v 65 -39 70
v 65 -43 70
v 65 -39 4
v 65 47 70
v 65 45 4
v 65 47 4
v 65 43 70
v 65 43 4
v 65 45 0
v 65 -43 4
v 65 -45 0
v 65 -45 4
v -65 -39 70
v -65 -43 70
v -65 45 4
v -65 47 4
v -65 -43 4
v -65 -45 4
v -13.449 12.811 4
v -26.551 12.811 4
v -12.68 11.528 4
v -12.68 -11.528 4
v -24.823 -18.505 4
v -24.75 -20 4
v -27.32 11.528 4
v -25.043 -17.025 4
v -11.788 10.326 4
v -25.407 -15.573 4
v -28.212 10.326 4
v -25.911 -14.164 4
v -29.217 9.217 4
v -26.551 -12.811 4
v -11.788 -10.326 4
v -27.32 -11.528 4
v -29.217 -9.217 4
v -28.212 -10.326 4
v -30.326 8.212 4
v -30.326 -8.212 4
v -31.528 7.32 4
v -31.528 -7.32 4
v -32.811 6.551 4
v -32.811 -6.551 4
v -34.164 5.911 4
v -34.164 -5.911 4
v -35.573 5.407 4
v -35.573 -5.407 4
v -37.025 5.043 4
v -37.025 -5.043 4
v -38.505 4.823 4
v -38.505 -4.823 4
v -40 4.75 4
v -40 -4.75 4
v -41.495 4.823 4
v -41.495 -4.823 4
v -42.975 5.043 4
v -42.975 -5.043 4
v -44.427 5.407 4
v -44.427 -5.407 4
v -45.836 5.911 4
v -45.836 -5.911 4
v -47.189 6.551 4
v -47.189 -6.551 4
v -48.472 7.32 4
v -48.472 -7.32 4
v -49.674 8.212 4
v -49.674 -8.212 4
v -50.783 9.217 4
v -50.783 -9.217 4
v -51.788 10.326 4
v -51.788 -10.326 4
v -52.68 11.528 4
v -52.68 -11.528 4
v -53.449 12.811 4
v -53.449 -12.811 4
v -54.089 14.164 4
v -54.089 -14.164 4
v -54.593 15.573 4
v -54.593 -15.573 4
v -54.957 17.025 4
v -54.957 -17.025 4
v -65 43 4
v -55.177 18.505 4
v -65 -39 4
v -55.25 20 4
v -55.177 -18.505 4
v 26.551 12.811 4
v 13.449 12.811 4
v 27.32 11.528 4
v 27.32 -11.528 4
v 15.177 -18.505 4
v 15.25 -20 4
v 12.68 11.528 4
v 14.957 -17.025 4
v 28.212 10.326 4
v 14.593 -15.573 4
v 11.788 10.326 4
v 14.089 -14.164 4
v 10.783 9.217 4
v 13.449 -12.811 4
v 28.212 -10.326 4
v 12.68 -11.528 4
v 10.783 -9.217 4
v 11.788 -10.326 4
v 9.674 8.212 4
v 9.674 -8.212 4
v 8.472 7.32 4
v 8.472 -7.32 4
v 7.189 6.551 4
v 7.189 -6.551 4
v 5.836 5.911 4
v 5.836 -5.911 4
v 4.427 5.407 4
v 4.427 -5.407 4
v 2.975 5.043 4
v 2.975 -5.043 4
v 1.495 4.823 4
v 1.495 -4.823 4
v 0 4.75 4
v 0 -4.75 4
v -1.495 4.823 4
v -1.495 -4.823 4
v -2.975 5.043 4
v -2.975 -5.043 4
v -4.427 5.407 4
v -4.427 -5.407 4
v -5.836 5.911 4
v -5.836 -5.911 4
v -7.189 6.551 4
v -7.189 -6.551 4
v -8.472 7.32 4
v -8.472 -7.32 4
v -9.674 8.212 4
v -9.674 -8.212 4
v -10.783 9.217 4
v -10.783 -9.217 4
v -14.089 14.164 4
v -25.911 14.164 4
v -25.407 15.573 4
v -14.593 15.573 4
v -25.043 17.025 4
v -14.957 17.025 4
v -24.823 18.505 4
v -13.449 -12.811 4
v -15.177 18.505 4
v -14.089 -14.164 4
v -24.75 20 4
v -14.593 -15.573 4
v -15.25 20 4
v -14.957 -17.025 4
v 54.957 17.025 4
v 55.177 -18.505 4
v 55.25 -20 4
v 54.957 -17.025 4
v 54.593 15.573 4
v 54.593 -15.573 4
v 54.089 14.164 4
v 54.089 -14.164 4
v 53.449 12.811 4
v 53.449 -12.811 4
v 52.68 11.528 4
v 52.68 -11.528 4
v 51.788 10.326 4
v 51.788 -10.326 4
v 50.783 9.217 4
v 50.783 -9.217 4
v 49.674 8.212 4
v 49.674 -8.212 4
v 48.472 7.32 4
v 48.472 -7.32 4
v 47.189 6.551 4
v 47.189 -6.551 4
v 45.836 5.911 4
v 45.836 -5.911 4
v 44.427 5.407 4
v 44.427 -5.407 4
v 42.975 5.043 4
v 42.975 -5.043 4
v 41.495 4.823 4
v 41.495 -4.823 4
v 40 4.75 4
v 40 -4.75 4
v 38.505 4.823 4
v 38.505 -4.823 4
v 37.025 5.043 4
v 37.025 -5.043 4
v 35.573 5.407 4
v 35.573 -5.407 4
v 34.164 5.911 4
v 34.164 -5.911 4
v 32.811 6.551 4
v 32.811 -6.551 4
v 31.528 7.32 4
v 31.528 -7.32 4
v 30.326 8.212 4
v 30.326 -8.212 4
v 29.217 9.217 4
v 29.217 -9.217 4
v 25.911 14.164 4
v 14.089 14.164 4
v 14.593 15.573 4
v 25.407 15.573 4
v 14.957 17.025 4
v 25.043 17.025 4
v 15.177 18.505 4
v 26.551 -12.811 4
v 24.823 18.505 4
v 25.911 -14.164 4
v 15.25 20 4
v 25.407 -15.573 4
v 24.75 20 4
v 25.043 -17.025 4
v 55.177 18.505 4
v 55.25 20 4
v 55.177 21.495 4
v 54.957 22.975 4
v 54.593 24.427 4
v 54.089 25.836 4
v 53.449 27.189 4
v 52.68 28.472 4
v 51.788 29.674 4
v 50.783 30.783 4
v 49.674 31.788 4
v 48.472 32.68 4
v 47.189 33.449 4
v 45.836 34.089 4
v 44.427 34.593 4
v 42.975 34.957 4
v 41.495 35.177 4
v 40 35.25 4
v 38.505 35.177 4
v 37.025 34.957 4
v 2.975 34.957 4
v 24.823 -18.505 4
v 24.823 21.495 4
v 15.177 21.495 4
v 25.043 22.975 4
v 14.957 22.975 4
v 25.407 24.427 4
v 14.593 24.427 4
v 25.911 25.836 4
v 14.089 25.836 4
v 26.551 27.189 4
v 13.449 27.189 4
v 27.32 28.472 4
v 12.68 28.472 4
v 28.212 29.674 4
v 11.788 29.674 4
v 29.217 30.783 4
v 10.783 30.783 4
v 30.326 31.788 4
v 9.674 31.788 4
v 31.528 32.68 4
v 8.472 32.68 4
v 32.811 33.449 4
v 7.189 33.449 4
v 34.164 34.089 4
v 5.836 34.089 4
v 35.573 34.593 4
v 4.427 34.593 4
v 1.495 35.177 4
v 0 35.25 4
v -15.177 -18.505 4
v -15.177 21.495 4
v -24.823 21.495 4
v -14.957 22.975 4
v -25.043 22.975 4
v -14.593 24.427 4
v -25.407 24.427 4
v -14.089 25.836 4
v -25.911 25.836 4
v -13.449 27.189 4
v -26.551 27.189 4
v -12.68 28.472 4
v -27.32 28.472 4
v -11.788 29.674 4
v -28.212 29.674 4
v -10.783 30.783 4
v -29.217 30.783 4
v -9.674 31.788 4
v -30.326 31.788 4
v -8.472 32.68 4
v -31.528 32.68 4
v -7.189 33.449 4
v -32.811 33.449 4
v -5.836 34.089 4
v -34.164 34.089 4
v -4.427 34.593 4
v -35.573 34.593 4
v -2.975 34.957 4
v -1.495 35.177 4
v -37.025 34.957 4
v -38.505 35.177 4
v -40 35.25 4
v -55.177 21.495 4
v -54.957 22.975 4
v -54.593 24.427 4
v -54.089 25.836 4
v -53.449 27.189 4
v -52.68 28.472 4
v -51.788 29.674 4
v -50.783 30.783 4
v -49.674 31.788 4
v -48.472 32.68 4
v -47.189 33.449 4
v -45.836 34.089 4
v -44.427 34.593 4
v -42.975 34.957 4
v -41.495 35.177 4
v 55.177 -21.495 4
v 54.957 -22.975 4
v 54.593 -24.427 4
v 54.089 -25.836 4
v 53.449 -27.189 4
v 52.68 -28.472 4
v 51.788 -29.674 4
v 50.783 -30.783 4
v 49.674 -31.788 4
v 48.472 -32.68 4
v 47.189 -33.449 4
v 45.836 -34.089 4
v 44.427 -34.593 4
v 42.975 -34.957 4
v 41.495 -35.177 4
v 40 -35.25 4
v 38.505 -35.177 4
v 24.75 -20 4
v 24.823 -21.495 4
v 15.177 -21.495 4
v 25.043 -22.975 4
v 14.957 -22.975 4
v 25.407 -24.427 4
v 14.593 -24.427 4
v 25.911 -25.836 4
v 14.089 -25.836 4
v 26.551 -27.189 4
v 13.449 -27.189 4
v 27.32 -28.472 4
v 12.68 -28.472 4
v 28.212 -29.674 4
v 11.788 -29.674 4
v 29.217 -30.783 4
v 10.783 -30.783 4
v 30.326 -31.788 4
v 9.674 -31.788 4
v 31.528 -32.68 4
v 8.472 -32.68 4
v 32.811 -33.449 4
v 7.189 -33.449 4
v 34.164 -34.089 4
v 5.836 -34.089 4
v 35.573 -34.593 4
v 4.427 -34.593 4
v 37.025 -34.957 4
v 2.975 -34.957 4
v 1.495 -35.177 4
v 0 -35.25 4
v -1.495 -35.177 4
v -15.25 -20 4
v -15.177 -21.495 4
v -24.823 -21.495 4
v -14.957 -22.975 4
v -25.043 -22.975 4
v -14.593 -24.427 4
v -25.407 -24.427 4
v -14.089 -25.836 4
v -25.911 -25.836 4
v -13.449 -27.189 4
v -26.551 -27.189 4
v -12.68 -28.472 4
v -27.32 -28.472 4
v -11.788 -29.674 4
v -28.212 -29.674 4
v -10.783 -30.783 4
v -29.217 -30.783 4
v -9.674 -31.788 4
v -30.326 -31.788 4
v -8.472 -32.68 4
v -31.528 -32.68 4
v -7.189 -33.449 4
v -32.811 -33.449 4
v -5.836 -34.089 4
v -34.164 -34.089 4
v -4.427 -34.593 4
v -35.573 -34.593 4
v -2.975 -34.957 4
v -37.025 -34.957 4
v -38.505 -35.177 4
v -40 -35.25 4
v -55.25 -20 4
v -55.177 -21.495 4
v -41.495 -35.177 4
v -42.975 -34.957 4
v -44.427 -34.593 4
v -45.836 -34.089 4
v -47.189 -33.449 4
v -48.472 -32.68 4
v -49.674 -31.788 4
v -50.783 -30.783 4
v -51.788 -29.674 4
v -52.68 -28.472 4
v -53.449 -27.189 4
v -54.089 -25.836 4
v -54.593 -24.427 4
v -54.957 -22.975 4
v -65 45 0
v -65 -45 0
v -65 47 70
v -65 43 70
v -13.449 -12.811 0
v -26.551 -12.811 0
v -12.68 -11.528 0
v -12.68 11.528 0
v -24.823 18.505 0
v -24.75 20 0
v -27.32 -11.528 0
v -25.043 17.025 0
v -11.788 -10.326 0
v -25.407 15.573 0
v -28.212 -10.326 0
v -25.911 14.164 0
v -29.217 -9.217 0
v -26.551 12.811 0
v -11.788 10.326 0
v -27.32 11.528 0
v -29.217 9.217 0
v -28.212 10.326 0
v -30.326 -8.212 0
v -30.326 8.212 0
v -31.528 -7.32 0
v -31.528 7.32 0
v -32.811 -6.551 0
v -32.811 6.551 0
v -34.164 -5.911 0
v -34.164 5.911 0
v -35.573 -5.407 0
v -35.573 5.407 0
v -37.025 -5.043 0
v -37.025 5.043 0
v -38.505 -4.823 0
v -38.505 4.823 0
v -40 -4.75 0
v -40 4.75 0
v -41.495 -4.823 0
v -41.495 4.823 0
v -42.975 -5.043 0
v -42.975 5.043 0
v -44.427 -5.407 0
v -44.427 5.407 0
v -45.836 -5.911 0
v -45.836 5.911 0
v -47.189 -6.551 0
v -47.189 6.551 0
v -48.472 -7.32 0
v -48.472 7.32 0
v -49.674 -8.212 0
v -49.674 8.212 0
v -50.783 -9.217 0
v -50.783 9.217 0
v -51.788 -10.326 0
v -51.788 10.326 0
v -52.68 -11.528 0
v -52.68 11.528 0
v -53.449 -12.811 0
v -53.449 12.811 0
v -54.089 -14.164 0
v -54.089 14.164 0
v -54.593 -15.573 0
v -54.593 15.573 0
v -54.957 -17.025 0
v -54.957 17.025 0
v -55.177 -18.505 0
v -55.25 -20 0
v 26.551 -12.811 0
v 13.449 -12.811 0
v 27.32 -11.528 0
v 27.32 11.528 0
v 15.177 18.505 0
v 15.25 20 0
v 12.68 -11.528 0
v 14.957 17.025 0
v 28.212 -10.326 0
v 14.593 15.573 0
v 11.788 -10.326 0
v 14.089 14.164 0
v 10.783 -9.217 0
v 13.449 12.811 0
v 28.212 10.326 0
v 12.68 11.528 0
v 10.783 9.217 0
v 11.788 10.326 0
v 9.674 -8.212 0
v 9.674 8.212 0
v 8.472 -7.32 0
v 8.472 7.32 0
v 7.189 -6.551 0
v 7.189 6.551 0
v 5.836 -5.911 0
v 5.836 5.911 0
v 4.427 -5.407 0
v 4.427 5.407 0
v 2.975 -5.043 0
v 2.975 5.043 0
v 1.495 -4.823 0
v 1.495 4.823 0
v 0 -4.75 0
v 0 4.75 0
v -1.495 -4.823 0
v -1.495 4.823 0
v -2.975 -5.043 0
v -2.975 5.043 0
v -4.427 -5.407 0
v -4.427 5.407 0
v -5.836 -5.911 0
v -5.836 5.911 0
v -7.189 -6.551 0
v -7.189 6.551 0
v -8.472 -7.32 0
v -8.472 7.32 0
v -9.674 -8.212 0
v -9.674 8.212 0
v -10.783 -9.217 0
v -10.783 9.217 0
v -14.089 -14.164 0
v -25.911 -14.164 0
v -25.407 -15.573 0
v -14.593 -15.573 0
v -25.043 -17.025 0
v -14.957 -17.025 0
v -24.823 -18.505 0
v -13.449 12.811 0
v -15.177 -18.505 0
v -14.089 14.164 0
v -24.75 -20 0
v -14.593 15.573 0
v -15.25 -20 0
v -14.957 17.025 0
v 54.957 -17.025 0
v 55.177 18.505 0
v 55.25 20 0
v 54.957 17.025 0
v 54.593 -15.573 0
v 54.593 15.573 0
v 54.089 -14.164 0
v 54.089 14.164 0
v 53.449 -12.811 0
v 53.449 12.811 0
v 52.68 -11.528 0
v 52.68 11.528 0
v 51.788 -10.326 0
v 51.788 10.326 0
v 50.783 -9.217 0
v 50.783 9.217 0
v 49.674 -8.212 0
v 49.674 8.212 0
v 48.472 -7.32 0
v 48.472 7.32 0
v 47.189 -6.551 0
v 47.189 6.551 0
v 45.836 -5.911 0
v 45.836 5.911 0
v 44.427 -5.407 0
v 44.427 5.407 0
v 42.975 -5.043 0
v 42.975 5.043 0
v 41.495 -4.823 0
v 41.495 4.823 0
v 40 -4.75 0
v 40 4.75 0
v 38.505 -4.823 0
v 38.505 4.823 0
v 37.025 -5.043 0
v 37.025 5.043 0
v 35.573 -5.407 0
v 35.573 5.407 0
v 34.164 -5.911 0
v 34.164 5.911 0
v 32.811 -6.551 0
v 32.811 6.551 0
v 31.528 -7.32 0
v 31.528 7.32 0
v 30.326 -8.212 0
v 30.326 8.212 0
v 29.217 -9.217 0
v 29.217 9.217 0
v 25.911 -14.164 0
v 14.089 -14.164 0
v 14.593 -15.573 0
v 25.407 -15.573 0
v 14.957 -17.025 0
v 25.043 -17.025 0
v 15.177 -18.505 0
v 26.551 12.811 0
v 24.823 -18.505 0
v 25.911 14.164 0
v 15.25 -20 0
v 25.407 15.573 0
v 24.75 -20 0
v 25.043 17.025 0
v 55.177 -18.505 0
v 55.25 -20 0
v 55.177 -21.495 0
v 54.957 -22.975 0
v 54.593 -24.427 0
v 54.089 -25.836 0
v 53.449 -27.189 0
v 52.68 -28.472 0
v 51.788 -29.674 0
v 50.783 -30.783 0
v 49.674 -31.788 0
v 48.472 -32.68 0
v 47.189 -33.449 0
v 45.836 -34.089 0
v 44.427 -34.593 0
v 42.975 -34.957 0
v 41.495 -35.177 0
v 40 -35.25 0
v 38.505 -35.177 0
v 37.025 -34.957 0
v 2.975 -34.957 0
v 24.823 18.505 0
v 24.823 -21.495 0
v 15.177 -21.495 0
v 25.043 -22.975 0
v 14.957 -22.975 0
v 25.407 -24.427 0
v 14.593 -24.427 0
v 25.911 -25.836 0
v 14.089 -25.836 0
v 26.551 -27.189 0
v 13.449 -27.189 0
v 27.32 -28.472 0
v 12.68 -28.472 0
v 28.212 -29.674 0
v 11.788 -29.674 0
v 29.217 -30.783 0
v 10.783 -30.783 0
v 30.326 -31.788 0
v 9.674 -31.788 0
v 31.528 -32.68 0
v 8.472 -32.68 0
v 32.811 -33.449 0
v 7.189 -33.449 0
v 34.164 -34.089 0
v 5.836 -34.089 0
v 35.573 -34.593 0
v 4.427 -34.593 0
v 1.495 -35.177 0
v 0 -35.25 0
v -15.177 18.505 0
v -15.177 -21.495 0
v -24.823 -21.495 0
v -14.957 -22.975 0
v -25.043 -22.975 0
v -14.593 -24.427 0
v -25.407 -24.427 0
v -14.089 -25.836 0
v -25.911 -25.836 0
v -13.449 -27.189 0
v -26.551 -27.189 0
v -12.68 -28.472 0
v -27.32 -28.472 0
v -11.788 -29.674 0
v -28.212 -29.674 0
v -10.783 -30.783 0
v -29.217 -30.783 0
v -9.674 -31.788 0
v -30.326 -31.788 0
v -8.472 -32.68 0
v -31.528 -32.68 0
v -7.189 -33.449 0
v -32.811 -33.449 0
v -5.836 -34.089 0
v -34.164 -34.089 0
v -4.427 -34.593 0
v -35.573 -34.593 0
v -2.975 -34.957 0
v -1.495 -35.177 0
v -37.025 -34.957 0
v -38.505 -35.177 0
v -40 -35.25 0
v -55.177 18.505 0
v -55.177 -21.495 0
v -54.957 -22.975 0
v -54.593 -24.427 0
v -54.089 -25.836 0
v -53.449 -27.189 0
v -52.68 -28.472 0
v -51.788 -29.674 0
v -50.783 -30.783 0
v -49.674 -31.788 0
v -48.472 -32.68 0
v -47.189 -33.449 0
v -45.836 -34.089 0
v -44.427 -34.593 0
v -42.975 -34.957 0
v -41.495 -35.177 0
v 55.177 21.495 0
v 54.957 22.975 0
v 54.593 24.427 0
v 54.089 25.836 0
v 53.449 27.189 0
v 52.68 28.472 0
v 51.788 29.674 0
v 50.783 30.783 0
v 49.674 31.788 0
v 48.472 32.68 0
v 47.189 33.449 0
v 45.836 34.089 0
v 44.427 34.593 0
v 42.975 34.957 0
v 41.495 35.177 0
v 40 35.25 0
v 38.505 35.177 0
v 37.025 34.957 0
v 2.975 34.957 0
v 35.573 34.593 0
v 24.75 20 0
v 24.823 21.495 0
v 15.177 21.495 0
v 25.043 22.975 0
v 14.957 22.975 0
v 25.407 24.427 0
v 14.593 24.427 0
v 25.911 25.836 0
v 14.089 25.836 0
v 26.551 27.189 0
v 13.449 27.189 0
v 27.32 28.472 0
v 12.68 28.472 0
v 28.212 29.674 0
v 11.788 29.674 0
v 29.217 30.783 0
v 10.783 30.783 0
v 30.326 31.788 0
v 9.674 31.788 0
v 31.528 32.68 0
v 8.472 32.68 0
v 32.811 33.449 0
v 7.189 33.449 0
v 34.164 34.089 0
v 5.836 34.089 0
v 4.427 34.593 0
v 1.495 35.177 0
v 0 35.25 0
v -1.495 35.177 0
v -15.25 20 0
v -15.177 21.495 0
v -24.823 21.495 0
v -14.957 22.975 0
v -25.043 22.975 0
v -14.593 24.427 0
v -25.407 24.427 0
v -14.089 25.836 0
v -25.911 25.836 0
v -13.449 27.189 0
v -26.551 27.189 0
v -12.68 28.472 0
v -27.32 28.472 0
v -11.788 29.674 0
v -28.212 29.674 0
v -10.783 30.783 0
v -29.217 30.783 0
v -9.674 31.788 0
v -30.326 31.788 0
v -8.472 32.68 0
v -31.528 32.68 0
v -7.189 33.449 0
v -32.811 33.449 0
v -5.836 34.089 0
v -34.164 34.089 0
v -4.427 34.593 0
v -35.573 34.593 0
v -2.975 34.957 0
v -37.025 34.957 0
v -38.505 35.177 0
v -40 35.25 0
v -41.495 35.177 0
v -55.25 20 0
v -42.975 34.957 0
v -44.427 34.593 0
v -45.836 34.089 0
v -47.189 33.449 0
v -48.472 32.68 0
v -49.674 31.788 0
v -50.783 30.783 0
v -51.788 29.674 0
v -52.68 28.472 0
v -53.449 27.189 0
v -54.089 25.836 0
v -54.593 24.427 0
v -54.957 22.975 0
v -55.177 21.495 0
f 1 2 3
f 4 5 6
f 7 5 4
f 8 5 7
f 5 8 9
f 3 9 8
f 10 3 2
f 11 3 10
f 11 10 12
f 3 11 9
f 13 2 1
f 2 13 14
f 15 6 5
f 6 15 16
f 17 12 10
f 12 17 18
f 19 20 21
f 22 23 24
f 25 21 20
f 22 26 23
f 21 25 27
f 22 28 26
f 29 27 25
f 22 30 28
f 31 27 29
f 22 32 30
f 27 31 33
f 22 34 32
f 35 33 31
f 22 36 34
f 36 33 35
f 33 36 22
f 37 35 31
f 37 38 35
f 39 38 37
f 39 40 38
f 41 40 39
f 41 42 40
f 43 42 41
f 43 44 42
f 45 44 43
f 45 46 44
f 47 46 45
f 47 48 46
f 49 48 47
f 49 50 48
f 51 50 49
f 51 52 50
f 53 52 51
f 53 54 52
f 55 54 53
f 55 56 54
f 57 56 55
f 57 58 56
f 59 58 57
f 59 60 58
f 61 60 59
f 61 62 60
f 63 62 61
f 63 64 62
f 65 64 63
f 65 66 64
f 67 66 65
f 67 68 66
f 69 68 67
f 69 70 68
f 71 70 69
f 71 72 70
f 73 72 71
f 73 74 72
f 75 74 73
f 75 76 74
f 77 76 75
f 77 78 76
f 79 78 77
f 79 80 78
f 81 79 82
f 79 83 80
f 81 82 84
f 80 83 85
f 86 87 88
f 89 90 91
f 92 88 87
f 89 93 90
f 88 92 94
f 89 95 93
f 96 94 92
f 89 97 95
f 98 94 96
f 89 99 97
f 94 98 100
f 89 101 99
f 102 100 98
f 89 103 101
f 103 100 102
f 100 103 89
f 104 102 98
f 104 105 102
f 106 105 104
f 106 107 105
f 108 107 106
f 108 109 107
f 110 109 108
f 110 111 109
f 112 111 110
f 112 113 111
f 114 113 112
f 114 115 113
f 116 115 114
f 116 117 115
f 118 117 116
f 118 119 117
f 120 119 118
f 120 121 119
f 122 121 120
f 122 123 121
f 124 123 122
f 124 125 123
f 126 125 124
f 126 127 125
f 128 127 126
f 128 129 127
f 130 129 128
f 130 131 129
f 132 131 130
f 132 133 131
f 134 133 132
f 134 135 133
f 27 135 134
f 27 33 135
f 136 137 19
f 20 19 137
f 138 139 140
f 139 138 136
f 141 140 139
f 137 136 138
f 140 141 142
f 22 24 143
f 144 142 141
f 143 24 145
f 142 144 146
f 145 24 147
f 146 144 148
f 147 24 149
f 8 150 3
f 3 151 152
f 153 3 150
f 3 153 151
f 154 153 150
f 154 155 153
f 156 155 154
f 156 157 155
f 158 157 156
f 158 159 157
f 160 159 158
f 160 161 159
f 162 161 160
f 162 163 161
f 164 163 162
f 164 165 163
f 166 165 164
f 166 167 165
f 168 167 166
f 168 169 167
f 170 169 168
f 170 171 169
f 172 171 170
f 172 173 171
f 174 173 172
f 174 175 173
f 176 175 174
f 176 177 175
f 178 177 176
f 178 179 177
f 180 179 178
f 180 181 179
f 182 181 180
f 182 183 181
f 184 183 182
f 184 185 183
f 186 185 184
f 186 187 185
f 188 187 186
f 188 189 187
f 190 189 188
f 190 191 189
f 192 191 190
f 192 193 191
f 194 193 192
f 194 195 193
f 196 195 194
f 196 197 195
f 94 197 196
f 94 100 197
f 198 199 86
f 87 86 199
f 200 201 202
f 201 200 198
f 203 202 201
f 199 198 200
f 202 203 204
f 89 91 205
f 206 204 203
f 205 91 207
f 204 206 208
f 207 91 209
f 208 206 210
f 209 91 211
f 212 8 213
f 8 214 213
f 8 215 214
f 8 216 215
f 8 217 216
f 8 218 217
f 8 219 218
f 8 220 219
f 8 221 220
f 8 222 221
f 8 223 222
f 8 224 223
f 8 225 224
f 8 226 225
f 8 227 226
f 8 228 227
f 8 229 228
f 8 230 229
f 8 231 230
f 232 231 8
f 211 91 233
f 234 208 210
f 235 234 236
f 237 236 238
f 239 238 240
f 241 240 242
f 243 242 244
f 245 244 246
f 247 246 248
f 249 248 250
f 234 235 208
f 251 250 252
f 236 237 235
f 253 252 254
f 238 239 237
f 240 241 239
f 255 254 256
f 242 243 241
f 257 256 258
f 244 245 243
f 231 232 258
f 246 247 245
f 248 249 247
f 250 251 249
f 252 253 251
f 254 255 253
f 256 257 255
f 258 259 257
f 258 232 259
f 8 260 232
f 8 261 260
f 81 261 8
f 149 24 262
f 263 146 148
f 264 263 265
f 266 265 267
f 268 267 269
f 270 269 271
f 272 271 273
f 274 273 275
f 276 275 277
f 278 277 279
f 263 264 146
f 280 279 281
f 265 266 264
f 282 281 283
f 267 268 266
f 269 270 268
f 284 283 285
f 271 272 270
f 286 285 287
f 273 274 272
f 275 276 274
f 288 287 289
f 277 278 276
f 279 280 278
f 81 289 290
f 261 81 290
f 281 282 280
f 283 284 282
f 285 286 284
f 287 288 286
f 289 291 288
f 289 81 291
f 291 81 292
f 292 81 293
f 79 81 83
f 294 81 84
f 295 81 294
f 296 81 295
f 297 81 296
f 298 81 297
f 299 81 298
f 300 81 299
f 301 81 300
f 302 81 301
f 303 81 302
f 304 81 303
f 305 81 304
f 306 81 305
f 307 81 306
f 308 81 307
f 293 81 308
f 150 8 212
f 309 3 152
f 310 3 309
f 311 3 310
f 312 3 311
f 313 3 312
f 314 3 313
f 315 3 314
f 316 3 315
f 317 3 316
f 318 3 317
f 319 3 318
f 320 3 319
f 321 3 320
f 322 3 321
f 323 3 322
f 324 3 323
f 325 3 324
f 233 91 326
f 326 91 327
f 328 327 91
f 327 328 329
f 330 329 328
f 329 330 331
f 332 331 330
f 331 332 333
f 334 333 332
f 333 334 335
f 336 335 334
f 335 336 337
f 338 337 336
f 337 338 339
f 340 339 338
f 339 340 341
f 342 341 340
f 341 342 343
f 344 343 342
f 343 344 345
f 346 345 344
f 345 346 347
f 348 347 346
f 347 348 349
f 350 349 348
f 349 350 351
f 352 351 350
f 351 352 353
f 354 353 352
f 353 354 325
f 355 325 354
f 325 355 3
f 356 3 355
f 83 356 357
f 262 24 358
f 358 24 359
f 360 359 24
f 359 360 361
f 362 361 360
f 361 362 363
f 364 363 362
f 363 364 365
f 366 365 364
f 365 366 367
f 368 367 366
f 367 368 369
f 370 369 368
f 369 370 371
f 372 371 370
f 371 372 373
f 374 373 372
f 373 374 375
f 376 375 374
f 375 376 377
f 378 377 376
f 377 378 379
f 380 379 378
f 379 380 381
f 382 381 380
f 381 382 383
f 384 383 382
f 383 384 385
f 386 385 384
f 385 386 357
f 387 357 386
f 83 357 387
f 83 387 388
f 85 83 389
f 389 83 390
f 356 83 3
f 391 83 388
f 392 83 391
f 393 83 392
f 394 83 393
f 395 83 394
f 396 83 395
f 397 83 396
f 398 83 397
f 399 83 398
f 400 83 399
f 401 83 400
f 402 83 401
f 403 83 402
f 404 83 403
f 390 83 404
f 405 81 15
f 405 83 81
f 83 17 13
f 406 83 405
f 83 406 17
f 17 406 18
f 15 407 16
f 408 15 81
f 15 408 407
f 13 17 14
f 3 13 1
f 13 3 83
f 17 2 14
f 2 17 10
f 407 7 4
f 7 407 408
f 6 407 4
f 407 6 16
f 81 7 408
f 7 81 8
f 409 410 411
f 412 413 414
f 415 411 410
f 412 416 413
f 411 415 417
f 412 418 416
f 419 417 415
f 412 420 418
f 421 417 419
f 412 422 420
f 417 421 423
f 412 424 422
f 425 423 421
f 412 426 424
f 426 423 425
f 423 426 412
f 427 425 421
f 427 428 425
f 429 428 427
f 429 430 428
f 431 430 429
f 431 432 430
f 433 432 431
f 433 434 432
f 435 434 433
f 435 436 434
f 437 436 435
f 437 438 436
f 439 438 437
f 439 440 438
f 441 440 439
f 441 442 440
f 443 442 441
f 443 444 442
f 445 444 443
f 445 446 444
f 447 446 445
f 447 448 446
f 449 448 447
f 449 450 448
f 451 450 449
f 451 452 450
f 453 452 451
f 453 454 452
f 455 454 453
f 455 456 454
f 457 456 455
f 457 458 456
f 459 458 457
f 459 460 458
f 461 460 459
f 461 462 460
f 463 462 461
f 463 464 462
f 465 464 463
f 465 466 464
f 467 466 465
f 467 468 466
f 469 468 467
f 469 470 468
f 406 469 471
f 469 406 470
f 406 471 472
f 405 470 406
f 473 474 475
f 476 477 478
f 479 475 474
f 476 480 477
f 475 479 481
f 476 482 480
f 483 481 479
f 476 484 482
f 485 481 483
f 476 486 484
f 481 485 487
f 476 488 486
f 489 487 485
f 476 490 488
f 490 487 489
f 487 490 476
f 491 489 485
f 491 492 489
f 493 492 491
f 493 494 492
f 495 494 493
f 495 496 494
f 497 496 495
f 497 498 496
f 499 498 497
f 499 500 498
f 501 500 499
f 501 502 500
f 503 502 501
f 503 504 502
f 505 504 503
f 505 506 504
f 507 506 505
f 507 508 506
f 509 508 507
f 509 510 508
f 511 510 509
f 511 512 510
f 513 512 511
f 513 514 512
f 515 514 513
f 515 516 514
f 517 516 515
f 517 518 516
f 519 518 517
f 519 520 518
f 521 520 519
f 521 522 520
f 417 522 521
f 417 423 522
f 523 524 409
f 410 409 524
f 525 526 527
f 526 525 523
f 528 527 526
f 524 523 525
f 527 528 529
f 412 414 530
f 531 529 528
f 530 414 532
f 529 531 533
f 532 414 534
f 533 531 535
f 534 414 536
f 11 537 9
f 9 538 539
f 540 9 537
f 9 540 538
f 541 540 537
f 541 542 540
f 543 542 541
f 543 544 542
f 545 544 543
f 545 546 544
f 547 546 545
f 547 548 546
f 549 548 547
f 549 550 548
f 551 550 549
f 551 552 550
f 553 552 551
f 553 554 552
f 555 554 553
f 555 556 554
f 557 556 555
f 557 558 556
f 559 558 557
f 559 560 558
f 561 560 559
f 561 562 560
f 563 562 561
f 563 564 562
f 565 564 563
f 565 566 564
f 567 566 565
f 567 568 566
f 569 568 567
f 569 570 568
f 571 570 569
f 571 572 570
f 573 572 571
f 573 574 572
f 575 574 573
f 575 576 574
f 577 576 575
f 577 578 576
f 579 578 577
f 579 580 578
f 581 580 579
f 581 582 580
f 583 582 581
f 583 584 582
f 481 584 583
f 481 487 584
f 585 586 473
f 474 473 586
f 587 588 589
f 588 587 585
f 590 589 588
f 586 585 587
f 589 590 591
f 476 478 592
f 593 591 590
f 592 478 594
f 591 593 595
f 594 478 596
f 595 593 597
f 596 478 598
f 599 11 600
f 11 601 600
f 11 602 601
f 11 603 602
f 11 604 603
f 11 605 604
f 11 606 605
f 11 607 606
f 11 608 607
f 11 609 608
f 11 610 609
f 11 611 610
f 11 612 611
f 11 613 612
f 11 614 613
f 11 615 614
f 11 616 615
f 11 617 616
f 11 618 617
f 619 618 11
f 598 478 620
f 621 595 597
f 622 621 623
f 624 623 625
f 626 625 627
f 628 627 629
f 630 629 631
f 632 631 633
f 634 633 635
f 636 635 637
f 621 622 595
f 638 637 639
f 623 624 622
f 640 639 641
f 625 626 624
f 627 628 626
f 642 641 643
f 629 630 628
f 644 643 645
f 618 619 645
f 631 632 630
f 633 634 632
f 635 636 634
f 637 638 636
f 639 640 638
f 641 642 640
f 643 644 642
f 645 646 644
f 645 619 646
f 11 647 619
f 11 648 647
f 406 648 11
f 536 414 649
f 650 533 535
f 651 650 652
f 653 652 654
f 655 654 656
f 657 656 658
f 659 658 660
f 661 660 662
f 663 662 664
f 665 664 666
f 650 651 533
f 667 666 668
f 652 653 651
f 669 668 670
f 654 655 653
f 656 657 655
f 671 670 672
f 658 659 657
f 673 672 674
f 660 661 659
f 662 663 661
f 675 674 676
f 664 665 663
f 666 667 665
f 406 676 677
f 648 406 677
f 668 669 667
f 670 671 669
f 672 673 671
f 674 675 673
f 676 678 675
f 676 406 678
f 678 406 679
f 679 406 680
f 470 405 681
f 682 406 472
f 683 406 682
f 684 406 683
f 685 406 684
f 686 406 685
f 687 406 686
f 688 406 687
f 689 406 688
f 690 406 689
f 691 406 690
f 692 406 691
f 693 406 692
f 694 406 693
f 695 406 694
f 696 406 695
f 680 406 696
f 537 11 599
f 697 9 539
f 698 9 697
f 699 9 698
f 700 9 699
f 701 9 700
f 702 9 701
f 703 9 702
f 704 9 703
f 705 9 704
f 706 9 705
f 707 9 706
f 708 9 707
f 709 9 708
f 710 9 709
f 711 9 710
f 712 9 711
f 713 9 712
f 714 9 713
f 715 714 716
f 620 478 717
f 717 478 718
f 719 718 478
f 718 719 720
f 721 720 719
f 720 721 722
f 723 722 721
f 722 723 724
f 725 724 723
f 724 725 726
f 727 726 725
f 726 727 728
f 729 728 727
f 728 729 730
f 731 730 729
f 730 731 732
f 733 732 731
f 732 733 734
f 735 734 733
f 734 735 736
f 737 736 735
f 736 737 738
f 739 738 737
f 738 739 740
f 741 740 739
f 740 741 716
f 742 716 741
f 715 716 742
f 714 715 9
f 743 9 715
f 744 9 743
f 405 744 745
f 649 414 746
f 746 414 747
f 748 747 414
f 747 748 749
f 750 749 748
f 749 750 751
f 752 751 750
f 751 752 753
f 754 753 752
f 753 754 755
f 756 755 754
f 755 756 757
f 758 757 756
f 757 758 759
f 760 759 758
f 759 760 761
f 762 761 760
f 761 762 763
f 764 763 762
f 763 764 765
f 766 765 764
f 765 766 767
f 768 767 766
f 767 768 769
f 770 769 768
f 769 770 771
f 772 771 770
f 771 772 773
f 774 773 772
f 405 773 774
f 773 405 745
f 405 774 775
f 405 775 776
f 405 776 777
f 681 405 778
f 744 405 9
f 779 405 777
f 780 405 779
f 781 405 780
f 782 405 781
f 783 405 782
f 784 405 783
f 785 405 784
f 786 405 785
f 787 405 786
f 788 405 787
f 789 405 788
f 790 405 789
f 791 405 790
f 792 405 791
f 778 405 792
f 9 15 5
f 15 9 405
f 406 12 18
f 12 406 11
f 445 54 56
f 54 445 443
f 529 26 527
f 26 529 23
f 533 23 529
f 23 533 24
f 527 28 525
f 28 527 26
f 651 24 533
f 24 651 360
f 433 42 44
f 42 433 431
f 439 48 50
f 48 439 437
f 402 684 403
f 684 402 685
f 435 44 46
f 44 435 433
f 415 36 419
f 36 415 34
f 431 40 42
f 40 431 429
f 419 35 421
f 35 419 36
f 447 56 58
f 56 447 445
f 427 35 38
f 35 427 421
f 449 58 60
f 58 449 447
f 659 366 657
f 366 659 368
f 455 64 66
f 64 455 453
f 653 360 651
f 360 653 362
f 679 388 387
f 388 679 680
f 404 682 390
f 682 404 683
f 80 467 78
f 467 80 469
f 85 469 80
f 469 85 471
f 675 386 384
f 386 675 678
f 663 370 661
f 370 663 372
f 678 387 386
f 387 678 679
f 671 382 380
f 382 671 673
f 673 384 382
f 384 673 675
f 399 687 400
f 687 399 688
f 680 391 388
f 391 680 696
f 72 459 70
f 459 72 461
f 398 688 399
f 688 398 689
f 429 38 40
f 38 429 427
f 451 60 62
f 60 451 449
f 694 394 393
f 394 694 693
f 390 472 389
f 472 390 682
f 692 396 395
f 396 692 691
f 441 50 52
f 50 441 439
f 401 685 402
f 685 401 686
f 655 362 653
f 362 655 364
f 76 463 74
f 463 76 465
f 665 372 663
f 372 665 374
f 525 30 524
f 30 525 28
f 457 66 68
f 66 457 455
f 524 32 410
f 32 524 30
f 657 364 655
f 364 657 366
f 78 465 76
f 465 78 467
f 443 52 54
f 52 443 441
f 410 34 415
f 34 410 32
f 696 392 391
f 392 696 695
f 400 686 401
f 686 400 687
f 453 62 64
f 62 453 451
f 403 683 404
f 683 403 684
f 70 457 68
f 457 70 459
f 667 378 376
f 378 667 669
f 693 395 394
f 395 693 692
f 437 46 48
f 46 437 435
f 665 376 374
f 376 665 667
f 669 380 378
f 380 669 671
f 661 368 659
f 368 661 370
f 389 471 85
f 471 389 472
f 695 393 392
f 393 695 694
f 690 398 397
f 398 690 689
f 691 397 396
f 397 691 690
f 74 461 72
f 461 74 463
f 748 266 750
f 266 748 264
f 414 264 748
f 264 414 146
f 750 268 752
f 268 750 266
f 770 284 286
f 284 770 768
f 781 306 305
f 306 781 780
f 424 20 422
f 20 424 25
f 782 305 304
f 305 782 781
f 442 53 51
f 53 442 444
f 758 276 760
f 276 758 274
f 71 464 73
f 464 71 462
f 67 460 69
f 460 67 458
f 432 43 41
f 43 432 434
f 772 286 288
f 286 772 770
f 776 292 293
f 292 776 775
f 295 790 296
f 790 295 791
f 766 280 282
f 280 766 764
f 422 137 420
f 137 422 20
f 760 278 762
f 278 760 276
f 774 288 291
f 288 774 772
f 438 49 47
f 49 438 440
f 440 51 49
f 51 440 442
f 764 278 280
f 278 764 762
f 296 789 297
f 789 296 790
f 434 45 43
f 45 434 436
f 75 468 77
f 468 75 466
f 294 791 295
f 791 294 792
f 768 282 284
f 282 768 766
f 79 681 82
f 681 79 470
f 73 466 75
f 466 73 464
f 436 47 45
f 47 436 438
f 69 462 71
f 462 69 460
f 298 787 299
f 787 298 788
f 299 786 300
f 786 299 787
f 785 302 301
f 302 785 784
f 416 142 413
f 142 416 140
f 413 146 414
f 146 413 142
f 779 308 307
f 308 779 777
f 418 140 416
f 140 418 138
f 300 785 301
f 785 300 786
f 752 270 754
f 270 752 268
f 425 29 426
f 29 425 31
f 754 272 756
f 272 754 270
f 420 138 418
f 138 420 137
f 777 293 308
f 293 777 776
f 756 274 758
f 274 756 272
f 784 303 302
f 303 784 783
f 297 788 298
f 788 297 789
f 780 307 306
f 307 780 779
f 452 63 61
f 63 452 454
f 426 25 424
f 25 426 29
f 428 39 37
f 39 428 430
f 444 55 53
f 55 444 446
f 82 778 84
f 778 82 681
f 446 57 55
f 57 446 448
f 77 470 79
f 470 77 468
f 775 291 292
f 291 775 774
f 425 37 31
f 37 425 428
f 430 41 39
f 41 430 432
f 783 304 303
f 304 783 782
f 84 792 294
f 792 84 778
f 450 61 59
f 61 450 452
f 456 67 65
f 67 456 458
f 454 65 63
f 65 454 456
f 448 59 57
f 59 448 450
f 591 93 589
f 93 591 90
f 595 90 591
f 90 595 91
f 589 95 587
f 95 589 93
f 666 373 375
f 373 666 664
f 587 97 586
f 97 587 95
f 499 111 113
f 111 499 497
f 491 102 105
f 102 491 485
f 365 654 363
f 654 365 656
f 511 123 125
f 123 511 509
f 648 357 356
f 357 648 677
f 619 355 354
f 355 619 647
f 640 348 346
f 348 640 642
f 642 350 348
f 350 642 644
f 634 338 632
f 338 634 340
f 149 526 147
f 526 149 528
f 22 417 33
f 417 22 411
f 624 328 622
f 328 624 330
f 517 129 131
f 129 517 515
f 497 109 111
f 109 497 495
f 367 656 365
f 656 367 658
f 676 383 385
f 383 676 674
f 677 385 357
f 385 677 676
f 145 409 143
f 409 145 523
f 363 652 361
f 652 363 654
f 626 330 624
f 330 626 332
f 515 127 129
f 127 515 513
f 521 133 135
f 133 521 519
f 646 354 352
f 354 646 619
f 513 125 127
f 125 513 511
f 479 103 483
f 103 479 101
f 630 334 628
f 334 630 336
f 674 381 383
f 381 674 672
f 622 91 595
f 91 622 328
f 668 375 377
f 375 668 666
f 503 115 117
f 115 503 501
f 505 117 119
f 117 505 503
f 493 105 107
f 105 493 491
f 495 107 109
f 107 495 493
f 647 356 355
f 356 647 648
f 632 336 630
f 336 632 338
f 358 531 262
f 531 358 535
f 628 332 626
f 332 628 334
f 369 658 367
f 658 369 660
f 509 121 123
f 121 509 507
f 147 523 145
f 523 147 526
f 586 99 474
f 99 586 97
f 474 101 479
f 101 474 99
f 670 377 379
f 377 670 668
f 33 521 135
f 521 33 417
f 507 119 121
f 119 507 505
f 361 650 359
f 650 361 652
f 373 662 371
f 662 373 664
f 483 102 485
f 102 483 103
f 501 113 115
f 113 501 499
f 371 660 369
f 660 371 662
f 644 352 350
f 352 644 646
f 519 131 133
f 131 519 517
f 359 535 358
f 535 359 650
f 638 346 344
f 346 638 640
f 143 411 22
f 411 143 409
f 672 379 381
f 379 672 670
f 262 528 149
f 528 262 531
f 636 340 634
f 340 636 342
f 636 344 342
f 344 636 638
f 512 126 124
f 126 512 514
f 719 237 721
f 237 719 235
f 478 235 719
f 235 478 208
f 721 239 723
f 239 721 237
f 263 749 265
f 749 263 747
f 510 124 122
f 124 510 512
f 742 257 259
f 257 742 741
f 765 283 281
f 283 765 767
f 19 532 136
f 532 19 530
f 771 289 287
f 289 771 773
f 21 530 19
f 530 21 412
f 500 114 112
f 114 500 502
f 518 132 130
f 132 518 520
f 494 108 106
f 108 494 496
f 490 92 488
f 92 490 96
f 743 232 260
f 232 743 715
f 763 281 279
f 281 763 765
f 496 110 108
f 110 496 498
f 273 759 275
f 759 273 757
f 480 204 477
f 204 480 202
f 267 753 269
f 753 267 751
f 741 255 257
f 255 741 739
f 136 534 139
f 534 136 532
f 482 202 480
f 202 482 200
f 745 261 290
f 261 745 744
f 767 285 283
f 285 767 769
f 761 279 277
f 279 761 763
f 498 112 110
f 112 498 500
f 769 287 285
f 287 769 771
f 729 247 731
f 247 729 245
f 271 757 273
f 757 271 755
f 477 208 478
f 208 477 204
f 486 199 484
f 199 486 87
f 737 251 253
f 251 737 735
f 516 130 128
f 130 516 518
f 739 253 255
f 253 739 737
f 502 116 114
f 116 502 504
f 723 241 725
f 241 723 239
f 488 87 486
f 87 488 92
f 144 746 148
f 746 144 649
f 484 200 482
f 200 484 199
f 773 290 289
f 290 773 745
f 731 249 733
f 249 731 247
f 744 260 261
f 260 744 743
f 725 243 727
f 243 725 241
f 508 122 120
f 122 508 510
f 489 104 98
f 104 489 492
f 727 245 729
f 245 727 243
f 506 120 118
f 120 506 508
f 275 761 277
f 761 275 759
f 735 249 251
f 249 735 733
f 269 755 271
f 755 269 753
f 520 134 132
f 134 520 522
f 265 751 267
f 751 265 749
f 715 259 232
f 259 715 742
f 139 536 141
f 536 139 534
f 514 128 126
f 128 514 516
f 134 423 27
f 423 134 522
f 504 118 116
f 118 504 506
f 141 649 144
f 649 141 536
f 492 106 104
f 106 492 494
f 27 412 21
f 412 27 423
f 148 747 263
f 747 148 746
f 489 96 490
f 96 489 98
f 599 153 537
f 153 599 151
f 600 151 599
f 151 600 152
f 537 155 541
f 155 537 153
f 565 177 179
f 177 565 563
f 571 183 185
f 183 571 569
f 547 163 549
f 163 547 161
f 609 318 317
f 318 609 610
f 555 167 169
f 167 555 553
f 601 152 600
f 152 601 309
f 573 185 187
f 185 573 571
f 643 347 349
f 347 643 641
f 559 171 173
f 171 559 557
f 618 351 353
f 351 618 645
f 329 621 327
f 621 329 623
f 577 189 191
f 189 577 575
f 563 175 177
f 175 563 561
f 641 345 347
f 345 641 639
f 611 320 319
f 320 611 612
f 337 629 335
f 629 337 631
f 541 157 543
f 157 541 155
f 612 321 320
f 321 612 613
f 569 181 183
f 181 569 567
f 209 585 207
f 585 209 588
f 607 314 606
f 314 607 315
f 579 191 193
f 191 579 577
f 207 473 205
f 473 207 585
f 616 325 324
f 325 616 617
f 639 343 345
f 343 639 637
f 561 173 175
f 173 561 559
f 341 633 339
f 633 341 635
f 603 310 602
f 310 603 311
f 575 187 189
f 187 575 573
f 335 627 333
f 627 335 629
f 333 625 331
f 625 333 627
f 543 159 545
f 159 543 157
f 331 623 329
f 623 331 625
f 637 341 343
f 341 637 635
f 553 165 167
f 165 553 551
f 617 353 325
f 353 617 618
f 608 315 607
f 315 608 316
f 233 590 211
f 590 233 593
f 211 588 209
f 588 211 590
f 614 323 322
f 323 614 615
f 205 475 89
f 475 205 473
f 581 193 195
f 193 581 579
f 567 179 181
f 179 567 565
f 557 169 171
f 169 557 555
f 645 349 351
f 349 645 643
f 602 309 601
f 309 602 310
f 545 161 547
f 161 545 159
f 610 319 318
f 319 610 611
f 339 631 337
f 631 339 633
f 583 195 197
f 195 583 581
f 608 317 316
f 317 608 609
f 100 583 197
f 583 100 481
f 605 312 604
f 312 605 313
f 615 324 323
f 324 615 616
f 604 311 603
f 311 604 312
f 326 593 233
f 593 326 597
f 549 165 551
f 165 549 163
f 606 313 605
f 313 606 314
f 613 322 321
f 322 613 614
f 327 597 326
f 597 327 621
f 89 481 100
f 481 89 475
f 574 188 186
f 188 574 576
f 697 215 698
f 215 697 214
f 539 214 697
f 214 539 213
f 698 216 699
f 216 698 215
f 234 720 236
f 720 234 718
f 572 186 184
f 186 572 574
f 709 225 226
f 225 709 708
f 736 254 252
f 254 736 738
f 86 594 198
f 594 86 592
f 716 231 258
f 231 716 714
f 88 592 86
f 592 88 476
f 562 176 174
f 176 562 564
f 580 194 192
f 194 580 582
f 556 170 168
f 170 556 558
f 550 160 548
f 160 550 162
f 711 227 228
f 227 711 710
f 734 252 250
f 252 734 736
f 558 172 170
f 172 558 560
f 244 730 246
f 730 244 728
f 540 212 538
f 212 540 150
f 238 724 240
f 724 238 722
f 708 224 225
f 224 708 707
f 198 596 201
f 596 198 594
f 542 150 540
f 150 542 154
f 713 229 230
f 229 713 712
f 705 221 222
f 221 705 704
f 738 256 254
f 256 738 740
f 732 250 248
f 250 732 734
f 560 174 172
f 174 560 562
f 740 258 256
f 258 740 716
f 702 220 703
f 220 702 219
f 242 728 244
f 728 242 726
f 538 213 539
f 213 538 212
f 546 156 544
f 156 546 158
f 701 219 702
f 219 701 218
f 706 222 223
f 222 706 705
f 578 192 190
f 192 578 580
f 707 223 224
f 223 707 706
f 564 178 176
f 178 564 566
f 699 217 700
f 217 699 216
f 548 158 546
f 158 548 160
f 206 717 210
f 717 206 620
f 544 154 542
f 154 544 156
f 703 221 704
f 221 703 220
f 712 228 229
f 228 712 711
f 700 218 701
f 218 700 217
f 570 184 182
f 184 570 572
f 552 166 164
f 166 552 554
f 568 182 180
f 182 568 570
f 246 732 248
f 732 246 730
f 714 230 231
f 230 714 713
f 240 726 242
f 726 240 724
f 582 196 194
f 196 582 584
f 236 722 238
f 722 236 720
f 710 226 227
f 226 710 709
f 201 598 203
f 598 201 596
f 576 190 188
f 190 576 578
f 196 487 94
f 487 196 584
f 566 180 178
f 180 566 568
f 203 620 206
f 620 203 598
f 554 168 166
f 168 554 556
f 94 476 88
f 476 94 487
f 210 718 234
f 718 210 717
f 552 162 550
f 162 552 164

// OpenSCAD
// Plate dimensions
plate_x = 130;        // X length
plate_y = 90;         // Y length
plate_z = 4;          // Thickness

// Hole dimensions
hole_dia = 30.5;      // Diameter
hole_spacing_x = 40;  // Centre-to-centre spacing in X
hole_spacing_y = 40;  // Centre-to-centre spacing in Y

// Wall dimensions
wall_len = 130;       // Length along X
wall_thick = 4;       // Thickness along Y
wall_height = 70;     // Total height from bed

// Build the solid body (plate + walls)
difference() {
    union() {
        // Plate centered at origin
        translate([-plate_x/2, -plate_y/2, 0])
        cube([plate_x, plate_y, plate_z]);
        
        // Two walls along long edges (Y = ±45)
        for (y = [-plate_y/2 + wall_thick/2, plate_y/2 - wall_thick/2]) {
            translate([-wall_len/2, y, plate_z])
            cube([wall_len, wall_thick, wall_height - plate_z]);
        }
    }
    // Cut through-holes
    for (x = [-hole_spacing_x, 0, hole_spacing_x]) {
        for (y = [-hole_spacing_y/2, hole_spacing_y/2]) {
            translate([x, y, -1])
            cylinder(h=plate_z + 2, d=hole_dia, $fn=64);
        }
    }
}
